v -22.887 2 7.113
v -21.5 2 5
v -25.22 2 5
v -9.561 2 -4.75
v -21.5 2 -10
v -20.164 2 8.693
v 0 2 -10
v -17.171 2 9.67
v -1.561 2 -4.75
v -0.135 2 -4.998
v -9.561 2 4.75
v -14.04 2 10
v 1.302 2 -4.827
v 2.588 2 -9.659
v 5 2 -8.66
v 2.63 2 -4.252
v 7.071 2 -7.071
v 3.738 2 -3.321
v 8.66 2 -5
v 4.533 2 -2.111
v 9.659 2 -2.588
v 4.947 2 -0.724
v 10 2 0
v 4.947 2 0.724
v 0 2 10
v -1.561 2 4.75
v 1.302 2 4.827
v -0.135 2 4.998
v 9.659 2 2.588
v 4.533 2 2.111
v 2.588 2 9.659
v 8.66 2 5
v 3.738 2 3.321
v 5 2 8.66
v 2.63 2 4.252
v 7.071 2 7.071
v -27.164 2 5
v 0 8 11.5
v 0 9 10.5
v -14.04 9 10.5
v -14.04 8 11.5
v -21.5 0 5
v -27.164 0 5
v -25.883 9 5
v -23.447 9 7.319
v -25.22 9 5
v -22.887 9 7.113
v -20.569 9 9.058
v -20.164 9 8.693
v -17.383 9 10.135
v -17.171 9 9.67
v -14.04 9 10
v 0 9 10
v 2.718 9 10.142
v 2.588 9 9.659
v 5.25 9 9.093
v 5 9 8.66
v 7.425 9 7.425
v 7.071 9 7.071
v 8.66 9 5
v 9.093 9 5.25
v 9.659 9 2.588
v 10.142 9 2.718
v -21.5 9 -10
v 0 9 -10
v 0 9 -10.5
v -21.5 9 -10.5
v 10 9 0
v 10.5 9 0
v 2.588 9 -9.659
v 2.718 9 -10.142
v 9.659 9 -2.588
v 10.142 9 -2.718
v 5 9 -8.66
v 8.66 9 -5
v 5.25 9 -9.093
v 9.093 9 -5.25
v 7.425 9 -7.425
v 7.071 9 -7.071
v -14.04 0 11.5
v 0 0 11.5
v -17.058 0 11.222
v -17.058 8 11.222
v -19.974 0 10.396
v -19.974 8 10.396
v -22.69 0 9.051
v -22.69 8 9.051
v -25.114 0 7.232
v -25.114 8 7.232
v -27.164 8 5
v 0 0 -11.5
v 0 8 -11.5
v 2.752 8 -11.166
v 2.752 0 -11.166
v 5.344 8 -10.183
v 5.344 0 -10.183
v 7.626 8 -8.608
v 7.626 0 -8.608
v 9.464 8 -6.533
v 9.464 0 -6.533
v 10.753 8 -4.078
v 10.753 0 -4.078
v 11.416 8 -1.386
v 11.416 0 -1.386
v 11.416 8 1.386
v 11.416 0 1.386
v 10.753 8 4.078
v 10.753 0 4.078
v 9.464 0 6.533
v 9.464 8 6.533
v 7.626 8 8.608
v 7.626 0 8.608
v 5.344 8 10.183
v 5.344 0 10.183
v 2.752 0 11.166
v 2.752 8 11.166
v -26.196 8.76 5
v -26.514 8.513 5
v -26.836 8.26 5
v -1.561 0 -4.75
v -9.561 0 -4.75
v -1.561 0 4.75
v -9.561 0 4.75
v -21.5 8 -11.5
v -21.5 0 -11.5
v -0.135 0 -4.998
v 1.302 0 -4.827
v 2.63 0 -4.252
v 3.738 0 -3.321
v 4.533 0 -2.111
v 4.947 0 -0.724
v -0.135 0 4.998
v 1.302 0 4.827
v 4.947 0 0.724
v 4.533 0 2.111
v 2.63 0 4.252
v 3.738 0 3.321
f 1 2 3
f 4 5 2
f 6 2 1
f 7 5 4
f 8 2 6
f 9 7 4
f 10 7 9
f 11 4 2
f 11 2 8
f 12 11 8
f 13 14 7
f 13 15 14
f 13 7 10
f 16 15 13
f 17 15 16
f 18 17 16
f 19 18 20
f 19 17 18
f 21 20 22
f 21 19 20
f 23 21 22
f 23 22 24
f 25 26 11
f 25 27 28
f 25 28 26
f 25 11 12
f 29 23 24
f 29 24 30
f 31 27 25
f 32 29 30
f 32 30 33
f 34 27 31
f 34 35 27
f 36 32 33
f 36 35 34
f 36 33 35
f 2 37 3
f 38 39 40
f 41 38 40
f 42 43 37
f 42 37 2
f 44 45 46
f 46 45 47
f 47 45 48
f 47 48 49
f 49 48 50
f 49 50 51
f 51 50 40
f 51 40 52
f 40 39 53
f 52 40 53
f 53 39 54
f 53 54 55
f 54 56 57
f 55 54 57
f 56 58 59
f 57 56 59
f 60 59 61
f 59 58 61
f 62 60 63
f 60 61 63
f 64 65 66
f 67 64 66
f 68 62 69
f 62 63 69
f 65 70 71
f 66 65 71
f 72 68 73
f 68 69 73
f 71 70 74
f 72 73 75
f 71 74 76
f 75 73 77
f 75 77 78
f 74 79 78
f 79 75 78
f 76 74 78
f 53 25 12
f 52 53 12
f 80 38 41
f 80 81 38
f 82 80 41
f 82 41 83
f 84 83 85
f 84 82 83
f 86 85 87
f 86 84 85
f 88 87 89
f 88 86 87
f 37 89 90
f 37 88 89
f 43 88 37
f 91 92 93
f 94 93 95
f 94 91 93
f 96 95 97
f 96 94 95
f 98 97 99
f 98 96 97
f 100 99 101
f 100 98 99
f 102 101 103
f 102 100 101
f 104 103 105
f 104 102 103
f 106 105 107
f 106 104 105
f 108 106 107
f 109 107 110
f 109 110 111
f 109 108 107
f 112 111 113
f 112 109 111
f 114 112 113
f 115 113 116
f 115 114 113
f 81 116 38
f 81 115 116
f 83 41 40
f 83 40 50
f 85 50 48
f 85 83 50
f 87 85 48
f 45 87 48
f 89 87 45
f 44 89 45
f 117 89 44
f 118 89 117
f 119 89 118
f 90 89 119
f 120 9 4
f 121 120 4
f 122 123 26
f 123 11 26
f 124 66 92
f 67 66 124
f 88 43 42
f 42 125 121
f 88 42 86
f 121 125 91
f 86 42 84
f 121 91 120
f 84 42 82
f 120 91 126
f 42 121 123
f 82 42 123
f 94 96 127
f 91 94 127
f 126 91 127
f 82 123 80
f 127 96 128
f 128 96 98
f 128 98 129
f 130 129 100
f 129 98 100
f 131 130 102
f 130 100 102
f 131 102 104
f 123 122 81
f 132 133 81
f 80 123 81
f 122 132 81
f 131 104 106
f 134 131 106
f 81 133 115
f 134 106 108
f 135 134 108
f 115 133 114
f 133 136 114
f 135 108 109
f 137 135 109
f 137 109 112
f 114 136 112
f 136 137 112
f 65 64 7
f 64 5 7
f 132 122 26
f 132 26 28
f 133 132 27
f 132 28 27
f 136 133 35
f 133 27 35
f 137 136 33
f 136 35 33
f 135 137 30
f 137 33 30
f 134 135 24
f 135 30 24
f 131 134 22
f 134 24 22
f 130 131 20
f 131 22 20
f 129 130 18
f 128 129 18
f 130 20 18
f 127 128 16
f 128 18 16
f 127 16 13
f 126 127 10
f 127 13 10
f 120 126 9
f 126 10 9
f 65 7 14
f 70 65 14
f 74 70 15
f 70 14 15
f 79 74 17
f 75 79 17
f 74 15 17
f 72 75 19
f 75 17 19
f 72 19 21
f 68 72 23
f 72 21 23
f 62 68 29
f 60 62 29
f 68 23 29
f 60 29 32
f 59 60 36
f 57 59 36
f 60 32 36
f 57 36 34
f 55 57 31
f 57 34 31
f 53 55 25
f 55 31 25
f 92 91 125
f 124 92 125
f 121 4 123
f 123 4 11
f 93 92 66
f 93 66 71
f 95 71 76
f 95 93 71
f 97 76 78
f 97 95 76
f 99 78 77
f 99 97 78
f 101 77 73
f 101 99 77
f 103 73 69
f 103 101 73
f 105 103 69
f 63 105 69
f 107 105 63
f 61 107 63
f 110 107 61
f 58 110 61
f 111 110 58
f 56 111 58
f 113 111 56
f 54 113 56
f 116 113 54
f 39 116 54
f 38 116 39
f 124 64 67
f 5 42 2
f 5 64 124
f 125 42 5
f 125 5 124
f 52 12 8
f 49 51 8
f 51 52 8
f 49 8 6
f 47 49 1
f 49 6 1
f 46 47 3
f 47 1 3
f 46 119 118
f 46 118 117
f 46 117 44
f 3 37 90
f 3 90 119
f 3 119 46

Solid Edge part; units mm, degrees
sketch "Sketch1" plane through (0, 0, 0) normal (0, -1, 0) x (1, 0, 0)
  arc A0 (0, 11.5) -> (0, -11.5) centre (0, 0) cw
  line L0 (0, -11.5) -> (-21.5, -11.5)
  line L1 (-21.5, 5) -> (-21.5, -11.5)
  line L2 (-27.1644, 5) -> (-21.5, 5)
  arc A1 (-14.04, 11.5) -> (-27.1644, 5) centre (-14.04, -5) ccw
  line L3 (0, 11.5) -> (-14.04, 11.5)
  dimension "D1" = 11.5
  dimension "D2" = 21.5
  dimension "D3" = 14.04
  dimension "D4" = 16.5
  dimension "D5" = 16.5
extrude "Protrusion1" add sketch "Sketch1" against normal blind 2
sketch "Sketch2" plane through (-7.8322, 2, 0) normal (0, 1, 0) x (1, 0, 0)
  line L0 (-13.6678, 11.5) -> (7.8322, 11.5)
  arc A0 (7.8322, 11.5) -> (7.8322, -11.5) centre (7.8322, 0) cw
  line L1 (7.8322, -11.5) -> (-6.2078, -11.5)
  arc A1 (-6.2078, -11.5) -> (-19.3322, -5) centre (-6.2078, 5) cw
  line L2 (-19.3322, -5) -> (-17.3881, -5)
  arc A2 (-17.3881, -5) -> (-6.2078, -10) centre (-6.2078, 5) ccw
  line L3 (7.8322, -10) -> (-6.2078, -10)
  arc A3 (7.8322, 10) -> (7.8322, -10) centre (7.8322, 0) cw
  line L4 (-13.6678, 10) -> (7.8322, 10)
  line L5 (-13.6678, 11.5) -> (-13.6678, 10)
  dimension "D1" = 1.5
  dimension "D2" = 10
  dimension "D3" = 1.5
  dimension "D4" = 15
extrude "Extrusionsausprägung_2" add sketch "Sketch2" along normal blind 7
chamfer "Fase_1" distance 1 angle 45 4 edges at (-7.02, 9, 11.5) (-21.3629, 9, 9.786) (11.5, 9, 0) (-10.75, 9, -11.5)
sketch "Sketch3" plane through (-7.6102, 2, 0) normal (0, 1, 0) x (1, 0, 0)
  circle A0 centre (7.6102, 0) radius 5
  dimension "D1" = 10
extrude "Cutout1" cut sketch "Sketch3" against normal through all
sketch "Sketch4" plane through (-7.6102, 2, 0) normal (0, 1, 0) x (1, 0, 0)
  line L0 (6.0489, 4.75) -> (-1.9511, 4.75)
  line L1 (-1.9511, 4.75) -> (-1.9511, -4.75)
  line L2 (-1.9511, -4.75) -> (6.0489, -4.75)
  line L3 (6.0489, -4.75) -> (6.0489, 4.75)
  dimension "D1" = 8
  dimension "D2" = 9.5
extrude "Cutout2" cut sketch "Sketch4" against normal through all
